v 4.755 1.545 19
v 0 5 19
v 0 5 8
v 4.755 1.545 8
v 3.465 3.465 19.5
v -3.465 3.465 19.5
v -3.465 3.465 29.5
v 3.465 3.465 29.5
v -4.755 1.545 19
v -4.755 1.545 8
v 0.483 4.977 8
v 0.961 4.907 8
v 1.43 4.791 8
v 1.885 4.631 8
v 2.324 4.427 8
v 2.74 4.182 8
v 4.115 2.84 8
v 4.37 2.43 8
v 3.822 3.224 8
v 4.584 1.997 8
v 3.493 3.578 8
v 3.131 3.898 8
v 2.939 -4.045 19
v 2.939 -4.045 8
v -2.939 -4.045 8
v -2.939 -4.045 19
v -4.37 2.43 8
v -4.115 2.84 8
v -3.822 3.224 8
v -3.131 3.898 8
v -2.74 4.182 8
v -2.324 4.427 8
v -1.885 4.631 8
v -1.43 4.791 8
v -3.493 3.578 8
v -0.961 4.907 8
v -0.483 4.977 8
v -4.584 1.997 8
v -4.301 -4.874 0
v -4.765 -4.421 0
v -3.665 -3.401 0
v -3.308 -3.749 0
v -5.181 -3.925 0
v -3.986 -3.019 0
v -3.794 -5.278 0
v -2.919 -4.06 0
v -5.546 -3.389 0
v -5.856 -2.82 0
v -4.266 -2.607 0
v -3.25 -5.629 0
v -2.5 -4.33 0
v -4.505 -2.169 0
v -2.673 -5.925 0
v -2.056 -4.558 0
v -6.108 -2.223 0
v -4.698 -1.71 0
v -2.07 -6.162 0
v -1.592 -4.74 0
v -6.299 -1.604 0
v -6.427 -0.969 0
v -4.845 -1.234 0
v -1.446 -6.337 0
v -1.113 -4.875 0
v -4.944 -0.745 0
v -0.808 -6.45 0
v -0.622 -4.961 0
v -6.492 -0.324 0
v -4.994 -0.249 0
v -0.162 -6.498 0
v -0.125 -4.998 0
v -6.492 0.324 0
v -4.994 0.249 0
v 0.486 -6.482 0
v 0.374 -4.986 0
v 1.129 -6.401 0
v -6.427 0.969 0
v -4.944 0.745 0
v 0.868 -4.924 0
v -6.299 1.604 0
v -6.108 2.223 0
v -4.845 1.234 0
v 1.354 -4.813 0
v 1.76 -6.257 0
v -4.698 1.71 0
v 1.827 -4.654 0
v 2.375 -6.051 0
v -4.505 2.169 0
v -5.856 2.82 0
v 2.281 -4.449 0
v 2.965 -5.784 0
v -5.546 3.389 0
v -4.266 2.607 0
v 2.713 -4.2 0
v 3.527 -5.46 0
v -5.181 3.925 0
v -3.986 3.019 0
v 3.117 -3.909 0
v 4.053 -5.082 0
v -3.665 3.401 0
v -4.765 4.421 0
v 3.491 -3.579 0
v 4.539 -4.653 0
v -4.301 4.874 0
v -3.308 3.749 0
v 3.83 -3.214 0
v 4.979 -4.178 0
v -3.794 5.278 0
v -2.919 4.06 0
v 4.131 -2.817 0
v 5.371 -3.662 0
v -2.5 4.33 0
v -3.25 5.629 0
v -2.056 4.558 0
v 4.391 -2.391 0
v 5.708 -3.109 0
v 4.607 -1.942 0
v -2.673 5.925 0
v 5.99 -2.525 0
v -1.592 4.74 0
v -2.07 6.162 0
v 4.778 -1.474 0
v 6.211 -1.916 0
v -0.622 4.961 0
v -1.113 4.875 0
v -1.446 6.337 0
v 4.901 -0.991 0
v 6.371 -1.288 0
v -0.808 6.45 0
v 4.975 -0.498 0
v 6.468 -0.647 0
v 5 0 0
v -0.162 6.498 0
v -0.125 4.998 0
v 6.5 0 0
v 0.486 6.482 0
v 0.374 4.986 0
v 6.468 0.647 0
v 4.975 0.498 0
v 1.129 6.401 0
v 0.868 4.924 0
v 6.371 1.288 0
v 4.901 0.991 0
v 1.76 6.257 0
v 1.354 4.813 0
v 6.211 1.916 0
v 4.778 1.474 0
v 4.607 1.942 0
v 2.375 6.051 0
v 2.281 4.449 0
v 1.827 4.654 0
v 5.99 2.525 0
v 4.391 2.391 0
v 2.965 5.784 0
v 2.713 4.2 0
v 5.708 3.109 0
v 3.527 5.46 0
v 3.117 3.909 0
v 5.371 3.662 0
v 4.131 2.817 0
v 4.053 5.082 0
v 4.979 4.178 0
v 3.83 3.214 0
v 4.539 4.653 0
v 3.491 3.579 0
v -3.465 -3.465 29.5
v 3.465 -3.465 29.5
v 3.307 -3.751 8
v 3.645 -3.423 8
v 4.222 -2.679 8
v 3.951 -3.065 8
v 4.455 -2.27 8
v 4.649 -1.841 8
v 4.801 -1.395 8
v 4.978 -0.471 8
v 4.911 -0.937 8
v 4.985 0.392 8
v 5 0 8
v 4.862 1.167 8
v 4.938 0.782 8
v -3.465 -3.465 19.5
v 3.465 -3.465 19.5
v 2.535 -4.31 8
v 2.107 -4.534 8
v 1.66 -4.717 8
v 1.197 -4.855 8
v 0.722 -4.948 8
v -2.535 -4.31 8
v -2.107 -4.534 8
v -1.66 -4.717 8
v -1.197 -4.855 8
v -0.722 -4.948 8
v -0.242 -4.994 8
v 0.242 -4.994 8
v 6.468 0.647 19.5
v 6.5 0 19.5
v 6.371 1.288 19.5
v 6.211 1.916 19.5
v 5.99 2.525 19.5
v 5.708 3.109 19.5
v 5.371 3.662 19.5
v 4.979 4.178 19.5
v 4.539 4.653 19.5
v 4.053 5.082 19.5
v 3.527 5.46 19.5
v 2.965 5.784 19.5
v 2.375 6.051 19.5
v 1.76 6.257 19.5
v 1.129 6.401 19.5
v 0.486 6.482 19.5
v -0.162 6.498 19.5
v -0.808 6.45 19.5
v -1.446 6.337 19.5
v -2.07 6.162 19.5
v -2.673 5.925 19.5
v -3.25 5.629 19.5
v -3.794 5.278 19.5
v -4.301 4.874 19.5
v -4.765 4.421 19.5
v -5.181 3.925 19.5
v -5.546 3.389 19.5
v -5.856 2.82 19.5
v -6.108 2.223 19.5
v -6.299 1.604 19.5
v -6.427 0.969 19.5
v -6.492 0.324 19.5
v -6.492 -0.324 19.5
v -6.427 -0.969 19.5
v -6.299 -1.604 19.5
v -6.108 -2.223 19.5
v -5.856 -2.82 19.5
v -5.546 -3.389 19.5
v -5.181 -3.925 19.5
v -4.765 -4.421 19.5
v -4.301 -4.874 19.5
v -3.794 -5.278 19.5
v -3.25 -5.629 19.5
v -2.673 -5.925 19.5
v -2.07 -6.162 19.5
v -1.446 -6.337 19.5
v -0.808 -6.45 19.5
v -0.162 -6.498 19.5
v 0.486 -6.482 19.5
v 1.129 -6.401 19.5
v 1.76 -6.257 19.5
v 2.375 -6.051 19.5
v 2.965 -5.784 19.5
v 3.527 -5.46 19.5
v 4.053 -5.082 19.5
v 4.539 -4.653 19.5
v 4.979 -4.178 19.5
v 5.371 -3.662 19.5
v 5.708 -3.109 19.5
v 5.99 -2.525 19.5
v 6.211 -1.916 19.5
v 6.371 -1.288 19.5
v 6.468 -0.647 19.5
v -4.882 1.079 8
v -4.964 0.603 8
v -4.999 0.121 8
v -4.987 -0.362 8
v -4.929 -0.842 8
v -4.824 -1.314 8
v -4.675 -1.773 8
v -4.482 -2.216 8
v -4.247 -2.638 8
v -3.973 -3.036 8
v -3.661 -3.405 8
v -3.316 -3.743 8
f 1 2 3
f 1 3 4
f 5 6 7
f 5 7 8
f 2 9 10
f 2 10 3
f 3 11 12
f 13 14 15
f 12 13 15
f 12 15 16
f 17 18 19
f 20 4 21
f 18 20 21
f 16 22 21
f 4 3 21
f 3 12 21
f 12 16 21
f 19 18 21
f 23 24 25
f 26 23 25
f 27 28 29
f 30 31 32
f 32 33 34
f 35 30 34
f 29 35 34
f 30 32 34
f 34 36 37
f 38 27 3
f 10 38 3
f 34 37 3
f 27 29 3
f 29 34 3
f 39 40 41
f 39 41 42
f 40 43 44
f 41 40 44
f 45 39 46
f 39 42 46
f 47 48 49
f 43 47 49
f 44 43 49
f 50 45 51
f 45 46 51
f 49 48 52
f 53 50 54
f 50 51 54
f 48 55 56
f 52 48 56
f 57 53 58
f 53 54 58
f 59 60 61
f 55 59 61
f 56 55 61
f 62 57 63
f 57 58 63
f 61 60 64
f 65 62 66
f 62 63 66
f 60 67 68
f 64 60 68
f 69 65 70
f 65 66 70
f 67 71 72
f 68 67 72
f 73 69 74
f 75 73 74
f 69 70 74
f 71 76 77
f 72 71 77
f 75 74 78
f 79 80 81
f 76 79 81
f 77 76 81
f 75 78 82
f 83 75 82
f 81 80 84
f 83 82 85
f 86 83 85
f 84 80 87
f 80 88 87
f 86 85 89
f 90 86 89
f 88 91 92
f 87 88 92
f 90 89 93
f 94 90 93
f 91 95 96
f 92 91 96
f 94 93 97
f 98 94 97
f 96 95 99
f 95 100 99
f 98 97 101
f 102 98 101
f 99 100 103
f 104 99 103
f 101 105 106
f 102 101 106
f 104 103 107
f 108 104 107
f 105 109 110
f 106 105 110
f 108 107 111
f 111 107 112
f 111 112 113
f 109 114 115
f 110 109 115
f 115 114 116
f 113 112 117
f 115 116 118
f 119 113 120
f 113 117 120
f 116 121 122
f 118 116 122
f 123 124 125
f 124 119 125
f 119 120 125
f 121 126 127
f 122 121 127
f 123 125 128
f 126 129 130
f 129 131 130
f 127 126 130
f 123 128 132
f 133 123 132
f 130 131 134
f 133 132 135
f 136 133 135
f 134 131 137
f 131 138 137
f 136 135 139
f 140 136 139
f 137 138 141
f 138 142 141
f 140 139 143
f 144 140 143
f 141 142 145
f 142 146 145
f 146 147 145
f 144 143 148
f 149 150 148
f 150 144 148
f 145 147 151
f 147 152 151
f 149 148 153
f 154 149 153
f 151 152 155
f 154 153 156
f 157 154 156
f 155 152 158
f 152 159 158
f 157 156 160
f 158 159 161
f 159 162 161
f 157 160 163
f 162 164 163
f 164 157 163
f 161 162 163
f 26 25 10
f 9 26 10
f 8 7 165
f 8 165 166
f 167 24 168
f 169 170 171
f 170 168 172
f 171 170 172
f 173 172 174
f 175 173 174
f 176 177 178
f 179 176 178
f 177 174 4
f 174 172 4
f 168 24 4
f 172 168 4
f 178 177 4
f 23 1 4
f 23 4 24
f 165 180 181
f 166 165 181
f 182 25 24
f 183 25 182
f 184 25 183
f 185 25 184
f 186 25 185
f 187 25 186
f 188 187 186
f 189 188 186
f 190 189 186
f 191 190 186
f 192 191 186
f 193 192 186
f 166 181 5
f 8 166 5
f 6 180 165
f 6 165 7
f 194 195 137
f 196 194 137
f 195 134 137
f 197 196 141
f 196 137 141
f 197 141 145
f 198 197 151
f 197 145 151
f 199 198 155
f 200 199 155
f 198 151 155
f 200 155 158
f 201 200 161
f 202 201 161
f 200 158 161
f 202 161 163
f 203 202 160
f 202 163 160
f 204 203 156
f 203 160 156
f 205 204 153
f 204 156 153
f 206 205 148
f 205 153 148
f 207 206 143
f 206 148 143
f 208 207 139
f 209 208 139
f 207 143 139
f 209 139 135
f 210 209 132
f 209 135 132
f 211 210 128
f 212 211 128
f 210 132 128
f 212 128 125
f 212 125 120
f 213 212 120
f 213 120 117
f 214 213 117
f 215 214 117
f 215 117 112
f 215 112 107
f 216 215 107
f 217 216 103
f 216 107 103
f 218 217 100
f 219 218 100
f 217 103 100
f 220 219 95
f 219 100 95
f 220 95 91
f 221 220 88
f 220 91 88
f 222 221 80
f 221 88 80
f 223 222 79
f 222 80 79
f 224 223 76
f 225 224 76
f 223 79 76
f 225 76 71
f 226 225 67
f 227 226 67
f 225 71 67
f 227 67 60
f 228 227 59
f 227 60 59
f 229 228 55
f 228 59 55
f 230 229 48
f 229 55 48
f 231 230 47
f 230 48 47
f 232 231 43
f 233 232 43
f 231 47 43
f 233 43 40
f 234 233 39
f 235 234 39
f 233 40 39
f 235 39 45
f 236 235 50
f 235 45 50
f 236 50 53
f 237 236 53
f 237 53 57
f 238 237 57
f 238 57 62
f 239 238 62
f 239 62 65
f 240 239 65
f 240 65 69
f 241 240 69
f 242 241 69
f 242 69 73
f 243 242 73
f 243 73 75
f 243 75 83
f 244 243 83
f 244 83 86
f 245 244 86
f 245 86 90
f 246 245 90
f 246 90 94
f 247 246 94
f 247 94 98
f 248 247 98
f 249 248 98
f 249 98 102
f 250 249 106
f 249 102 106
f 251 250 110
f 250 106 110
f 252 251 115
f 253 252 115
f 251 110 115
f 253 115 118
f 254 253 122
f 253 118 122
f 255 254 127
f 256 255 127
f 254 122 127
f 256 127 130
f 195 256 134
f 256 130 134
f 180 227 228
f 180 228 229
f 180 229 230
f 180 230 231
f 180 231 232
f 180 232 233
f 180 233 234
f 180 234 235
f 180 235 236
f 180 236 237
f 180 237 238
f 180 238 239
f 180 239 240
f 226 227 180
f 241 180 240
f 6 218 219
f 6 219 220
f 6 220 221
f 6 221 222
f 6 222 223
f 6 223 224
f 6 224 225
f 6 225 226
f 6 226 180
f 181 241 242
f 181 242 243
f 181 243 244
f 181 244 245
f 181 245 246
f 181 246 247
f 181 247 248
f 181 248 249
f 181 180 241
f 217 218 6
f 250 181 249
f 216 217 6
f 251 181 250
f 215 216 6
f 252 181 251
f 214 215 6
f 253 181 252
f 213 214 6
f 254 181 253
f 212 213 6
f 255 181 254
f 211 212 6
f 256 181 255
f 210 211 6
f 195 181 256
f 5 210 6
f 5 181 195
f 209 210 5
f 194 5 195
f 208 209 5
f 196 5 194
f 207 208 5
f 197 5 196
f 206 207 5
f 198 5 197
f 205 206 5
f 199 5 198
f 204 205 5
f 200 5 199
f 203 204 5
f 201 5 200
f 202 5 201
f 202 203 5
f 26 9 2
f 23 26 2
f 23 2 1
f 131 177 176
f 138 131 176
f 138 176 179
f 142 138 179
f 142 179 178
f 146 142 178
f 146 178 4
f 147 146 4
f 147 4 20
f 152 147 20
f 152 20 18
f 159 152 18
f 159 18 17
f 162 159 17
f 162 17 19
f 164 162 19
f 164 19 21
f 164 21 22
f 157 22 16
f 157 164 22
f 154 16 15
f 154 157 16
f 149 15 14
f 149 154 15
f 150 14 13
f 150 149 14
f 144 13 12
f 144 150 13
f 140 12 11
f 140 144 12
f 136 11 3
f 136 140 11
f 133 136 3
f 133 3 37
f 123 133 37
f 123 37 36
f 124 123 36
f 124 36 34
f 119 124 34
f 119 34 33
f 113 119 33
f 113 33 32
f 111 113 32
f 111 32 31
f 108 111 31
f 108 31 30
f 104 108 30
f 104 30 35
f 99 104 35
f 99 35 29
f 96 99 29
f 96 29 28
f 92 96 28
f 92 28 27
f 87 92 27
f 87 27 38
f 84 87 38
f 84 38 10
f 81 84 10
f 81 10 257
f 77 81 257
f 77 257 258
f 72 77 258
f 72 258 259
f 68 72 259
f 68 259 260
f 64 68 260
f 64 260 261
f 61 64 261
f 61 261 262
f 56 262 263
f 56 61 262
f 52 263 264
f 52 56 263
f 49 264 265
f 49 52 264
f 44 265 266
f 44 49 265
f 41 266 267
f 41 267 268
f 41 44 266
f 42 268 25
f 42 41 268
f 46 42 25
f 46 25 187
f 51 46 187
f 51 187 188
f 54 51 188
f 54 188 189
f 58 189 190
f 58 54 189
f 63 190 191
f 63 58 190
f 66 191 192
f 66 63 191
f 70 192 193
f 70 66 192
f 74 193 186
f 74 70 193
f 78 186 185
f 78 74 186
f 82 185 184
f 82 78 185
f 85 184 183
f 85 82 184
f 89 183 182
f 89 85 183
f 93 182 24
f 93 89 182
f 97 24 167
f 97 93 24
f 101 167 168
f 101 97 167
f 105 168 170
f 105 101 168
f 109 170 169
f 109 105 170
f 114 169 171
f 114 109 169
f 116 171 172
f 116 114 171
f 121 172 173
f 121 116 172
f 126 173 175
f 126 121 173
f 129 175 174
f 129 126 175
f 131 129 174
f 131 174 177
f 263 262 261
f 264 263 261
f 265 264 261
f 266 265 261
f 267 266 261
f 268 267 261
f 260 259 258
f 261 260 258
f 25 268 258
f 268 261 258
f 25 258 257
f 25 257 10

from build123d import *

# Parameters (mm, degrees)
F0_R     = 6.5
F0_R_2   = 5
F1_DEPTH = 8
F2_R     = 6.5
F3_DEPTH = 11
F4_R     = 6.5
F5_DEPTH = 0.5
F6_W     = 6.929646
F6_H     = 6.929646
F7_DEPTH = 10


with BuildPart() as f1:
    # F0 (on Top) → F1 (new body)
    with BuildSketch(Plane.XY):
        Circle(F0_R)
        Circle(F0_R_2, mode=Mode.SUBTRACT)
    extrude(amount=F1_DEPTH)

    # F2 (on face) → F3 (join)
    with BuildSketch(Plane.XY.offset(8)):
        Circle(F2_R)
        Polygon((4.755283, 1.545085), (2.938926, -4.045085), (-2.938926, -4.045085), (-4.755283, 1.545085), (0, 5), align=None, mode=Mode.SUBTRACT)
    extrude(amount=F3_DEPTH)

    # F4 (on face) → F5 (join)
    with BuildSketch(Plane.XY.offset(19)):
        Circle(F4_R)
    extrude(amount=F5_DEPTH)

    # F6 (on face) → F7 (join)
    with BuildSketch(Plane.XY.offset(19.5)):
        Rectangle(F6_W, F6_H)
    extrude(amount=F7_DEPTH)


solid = f1.part
